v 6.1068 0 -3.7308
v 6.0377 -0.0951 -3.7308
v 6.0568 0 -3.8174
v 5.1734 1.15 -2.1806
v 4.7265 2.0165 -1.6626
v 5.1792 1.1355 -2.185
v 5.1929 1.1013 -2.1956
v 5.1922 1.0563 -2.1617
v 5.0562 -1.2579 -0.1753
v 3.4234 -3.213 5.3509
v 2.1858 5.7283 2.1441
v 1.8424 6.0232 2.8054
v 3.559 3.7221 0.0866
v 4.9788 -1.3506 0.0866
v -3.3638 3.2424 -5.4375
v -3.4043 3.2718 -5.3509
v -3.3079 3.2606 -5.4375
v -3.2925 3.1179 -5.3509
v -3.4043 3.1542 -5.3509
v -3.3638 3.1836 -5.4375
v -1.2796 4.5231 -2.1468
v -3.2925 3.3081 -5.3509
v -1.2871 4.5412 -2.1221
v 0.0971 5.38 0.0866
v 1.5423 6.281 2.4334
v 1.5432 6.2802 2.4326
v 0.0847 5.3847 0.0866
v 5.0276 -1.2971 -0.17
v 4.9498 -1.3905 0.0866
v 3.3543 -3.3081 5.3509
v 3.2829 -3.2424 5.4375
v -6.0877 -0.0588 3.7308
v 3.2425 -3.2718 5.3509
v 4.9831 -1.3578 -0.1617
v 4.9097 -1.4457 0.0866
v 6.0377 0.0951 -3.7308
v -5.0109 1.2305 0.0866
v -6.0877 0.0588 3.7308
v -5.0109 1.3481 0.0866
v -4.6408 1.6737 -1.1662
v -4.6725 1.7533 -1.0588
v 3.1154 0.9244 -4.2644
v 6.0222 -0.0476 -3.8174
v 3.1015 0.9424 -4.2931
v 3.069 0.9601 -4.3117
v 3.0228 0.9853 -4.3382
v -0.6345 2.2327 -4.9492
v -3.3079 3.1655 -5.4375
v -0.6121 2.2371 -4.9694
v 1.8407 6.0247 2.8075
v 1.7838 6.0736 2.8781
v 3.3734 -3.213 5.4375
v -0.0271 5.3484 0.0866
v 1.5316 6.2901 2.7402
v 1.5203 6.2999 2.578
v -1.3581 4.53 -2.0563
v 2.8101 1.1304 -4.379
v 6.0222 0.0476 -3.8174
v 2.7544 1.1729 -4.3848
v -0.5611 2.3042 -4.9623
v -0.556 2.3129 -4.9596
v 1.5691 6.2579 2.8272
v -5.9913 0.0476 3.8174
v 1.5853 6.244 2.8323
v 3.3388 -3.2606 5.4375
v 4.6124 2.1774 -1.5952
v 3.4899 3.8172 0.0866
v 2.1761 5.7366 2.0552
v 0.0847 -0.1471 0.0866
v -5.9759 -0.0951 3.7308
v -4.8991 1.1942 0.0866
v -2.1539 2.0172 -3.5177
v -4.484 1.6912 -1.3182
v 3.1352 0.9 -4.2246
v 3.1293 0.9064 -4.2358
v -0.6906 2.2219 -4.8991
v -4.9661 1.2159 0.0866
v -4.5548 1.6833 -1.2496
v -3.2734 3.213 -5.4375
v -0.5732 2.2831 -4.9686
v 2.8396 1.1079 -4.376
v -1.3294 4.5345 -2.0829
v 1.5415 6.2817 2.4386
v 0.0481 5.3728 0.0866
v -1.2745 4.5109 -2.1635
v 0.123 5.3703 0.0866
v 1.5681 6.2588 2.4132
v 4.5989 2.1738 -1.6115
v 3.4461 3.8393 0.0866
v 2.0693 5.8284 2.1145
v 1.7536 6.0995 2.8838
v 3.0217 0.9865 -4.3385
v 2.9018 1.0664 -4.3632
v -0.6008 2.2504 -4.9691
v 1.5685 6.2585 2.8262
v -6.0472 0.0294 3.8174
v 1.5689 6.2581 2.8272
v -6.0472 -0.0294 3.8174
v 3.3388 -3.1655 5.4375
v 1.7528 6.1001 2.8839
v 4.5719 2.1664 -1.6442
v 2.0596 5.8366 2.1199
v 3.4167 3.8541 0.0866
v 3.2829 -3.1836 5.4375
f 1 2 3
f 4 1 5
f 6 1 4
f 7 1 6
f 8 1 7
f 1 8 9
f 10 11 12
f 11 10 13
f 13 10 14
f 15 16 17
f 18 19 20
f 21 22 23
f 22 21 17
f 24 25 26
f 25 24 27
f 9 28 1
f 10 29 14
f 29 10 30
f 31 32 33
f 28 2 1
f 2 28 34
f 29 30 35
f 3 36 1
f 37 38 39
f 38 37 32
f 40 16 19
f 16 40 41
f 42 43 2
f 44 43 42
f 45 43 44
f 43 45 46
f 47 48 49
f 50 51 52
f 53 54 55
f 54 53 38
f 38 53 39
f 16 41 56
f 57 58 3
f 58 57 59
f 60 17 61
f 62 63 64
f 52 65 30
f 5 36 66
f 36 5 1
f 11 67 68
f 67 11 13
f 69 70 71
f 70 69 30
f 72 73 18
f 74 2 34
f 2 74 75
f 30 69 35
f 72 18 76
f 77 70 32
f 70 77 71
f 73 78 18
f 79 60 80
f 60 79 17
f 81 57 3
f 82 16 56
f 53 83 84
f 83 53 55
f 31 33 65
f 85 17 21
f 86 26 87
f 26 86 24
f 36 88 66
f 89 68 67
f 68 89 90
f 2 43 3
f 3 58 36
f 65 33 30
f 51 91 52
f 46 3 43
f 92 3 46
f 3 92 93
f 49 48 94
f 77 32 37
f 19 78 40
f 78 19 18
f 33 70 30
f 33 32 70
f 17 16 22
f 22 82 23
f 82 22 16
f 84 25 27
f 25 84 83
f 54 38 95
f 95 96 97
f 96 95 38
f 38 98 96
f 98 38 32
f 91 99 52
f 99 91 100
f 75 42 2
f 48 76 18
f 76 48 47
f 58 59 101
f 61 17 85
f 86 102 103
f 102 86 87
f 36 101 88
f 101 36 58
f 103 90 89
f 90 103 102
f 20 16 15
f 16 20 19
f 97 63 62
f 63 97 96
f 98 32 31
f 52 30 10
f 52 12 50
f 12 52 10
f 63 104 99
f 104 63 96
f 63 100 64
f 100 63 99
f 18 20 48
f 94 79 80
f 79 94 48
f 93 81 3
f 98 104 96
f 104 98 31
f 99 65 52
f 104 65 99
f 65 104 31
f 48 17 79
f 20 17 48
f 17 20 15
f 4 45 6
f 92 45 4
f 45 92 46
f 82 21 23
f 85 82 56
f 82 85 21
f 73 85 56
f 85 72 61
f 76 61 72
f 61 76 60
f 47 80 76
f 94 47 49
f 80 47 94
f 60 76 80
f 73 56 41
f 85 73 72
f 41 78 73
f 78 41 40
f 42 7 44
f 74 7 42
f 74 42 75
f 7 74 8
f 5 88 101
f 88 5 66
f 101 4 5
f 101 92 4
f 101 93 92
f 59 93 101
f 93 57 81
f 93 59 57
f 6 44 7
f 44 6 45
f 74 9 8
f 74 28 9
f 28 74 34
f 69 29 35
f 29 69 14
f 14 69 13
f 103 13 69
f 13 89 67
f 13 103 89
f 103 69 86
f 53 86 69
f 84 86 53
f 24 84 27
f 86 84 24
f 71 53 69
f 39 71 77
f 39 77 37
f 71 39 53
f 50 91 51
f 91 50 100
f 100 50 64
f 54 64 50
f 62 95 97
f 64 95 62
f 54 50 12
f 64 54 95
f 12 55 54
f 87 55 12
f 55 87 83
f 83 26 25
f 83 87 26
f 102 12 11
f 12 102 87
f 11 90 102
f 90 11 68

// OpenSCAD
// Auto-generated OpenSCAD file

    inner_points = 10*[[0.7245880980657288, 0.12609962772758243, 1.0181341605432133e-13], [-0.6855635385041695, 0.018990515700464568, -1.0181341605432133e-13], [0.07306683579433854, -0.6325307465709257, 7.388094116376098e-14], [-0.03404227623277932, 0.7776208899989726, -7.388094116376098e-14], [0.019512279780886727, 0.07254507171395753, -0.7071067811865476]];

    outer_points = 10*[[0.6006779226054043, 0.0, -0.37307644430392006], [-0.6006779226054043, 0.0, 0.37307644430392006], [-0.33233807096506035, 0.3213003592020604, -0.5350864283121461], [0.33233807096506035, -0.3213003592020604, 0.5350864283121461], [0.169521207763744, 0.6298937046650228, 0.2729404347869597]];

    // Convex hull for inner set (I)
    module inner_hull() {
        hull() {
            for (p = inner_points) {
                translate(p) sphere(r=0.1);
            }
        }
    }

    // Convex hull for outer set (O) minus inner hull (O \ I)
    module outer_minus_inner() {
        difference() {
            hull() {
                for (p = outer_points) {
                    translate(p) sphere(r=0.1);
                }
            }
            inner_hull(); // Subtract inner hull
        }
    }

    // Convex hull for outer set (O) minus all translated inner hulls
    module outer_minus_AllTranslationInner() {
        difference() {
            hull() {
                for (p = outer_points) {
                    translate(p) sphere(r=0.1);
                }
            }
            hull() {
                translate([0,0,50]) inner_hull();
                translate([0,0,-50]) inner_hull();
            }; // Subtract translated inner hulls
        }
    }

    // Difference between outer_minus_inner and outer_minus_AllTranslationInner
    module outer_minus_inner_diff() {
        difference() {
            // Outer minus inner
            difference() {
                hull() {
                    for (p = outer_points) {
                        translate(p) sphere(r=0.1);
                    }
                }
                inner_hull();
            }

            // Subtract Outer minus AllTranslationInner
            difference() {
                hull() {
                    for (p = outer_points) {
                        translate(p) sphere(r=0.1);
                    }
                }
                hull() {
                    translate([0,0,50]) inner_hull();
                    translate([0,0,-50]) inner_hull();
                };
            }
        }
    }

    // Rendering all with colors applied
    color([1, 1, 0, 1]) outer_minus_inner_diff(); // Opaque yellow
    
